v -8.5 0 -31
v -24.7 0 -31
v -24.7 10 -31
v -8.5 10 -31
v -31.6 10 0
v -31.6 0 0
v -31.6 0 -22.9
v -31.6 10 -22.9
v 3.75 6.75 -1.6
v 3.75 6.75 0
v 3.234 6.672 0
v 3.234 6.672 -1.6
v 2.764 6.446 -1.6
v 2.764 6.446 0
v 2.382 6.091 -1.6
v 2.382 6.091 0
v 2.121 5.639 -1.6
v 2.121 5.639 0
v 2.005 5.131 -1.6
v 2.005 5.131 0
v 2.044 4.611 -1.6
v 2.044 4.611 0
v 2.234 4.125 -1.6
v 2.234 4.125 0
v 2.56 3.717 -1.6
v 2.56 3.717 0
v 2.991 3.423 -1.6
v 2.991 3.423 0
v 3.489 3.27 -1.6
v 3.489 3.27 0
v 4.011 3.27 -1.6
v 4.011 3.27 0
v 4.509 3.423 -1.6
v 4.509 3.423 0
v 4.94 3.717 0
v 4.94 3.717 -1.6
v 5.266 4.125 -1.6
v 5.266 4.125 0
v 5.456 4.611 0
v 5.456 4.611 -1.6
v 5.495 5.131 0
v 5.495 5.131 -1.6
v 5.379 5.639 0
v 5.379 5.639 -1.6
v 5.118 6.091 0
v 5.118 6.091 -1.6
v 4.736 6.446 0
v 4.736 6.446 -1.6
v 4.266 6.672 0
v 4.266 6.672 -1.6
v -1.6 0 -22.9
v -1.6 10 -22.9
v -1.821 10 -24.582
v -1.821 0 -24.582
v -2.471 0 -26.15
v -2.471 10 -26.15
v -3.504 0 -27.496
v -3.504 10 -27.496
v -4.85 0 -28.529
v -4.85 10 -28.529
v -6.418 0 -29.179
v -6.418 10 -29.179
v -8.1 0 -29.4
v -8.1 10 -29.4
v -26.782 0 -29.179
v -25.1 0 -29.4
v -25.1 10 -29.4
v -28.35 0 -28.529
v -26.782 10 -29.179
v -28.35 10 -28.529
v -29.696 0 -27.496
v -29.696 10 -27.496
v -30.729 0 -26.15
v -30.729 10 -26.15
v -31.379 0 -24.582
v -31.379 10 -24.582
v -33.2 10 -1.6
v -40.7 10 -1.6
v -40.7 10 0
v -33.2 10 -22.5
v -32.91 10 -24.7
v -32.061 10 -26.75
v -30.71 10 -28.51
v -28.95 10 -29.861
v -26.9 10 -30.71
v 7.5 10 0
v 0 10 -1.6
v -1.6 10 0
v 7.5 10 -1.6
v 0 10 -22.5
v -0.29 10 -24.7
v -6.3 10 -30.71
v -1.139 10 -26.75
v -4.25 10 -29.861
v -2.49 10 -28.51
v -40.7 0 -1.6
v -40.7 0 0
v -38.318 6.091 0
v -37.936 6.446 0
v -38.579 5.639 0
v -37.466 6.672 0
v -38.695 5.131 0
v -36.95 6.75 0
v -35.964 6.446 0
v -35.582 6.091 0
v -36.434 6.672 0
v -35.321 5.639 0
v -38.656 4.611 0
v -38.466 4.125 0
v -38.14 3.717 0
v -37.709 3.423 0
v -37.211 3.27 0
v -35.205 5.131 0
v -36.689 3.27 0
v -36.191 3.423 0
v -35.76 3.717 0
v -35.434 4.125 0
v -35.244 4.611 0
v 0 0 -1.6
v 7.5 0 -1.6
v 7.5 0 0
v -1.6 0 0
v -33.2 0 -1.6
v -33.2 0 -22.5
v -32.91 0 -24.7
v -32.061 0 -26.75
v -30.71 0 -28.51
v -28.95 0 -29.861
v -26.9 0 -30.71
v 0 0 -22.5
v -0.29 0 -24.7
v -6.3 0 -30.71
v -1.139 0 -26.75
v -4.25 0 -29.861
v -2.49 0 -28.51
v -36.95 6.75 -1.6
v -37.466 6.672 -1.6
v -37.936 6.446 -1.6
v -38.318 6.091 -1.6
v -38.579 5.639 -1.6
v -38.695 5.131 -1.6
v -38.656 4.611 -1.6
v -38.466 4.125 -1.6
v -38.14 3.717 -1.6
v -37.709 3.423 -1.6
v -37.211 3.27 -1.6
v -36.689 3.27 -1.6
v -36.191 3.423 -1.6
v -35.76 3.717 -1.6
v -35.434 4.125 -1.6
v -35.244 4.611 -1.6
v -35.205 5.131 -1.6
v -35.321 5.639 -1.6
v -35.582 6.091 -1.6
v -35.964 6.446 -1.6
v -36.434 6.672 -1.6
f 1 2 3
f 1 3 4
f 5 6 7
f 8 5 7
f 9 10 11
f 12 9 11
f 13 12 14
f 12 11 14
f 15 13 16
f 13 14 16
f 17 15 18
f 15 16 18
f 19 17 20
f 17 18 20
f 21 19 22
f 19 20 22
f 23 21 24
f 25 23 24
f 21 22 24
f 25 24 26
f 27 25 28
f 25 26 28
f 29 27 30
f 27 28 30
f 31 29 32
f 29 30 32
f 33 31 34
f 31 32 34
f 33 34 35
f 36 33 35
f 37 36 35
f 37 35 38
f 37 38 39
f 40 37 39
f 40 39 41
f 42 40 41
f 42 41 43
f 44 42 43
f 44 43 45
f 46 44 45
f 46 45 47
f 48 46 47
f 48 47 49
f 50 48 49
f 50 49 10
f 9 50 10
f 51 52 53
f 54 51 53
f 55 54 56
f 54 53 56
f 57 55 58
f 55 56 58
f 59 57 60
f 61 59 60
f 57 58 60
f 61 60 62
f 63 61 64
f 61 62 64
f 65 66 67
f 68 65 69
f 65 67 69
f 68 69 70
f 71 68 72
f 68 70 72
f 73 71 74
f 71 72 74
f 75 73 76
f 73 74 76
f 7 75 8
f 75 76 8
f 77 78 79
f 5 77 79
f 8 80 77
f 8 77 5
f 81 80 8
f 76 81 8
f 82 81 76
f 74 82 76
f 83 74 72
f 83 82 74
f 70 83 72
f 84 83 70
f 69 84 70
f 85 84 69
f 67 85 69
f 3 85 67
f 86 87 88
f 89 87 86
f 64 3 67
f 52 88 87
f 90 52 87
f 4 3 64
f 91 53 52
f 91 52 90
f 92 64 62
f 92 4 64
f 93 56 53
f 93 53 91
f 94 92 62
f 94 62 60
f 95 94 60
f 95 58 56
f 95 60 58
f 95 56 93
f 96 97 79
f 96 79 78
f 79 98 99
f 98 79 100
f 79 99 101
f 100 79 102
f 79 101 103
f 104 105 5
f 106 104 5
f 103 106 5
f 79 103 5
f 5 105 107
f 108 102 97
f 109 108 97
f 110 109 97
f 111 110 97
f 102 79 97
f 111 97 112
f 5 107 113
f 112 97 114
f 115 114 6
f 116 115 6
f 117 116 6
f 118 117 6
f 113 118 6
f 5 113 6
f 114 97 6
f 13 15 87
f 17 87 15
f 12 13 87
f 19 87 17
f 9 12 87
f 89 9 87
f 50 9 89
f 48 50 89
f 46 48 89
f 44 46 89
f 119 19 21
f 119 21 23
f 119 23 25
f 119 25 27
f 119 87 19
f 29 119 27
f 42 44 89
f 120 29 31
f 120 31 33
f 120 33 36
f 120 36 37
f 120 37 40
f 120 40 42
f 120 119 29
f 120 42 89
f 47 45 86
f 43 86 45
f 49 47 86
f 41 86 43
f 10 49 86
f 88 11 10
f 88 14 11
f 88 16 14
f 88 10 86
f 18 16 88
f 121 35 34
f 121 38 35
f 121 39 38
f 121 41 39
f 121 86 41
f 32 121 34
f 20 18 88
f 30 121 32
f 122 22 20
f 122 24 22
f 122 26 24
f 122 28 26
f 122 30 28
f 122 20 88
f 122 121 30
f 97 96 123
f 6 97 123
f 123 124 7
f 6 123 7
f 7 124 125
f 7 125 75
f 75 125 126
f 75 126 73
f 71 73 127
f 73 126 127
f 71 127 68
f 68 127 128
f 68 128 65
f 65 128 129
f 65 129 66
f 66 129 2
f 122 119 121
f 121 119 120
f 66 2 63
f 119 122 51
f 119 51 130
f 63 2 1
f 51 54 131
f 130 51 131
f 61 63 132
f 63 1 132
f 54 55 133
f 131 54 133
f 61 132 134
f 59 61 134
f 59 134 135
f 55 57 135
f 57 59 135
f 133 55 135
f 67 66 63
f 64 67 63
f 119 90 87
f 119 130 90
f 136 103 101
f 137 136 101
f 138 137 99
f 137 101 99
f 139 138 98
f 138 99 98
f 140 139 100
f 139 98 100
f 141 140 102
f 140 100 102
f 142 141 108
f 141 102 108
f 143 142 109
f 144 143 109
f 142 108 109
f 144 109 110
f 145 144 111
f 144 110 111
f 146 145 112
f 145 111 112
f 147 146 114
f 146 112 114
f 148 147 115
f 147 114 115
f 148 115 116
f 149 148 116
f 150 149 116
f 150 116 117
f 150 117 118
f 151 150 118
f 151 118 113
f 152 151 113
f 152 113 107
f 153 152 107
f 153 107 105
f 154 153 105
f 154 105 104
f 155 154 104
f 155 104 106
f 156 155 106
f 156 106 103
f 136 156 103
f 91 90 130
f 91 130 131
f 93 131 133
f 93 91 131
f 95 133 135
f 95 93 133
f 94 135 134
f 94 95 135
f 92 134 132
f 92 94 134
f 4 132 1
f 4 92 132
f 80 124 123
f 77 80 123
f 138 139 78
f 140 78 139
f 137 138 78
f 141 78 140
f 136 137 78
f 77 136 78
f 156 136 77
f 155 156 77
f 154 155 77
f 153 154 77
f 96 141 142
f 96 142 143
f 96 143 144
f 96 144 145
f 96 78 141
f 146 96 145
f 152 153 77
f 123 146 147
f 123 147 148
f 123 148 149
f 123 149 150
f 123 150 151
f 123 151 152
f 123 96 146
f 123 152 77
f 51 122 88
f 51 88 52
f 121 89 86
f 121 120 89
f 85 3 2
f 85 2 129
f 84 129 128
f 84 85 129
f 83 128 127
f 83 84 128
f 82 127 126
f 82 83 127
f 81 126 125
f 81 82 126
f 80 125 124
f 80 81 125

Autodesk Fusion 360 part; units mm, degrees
sketch "Sketch1" plane through (0, 0, 0) normal (0, 1, 0) x (1, 0, 0)
  line L0 (0, 0) -> (-1.6, 0)
  line L1 (-1.6, 0) -> (-1.6, 31)
  line L2 (-1.6, 31) -> (0, 31)
  line L3 (0, 31) -> (0, 0)
  line L4 (7.5, 0) -> (0, 0)
  line L5 (0, 0) -> (0, 1.6)
  line L6 (0, 1.6) -> (7.5, 1.6)
  line L7 (7.5, 1.6) -> (7.5, 0)
  line L8 (-1.6, 31) -> (-31.6, 31)
  line L9 (-31.6, 31) -> (-31.6, 29.4)
  line L10 (-31.6, 29.4) -> (-1.6, 29.4)
  line L11 (-1.6, 29.4) -> (-1.6, 31)
  line L12 (-31.6, 31) -> (-33.2, 31)
  line L13 (-33.2, 31) -> (-33.2, 0)
  line L14 (-33.2, 0) -> (-31.6, 0)
  line L15 (-31.6, 0) -> (-31.6, 31)
  line L16 (-40.7, 1.6) -> (-33.2, 1.6)
  line L17 (-33.2, 1.6) -> (-33.2, 0)
  line L18 (-33.2, 0) -> (-40.7, 0)
  line L19 (-40.7, 0) -> (-40.7, 1.6)
  dimension "d2" = 1.6
  dimension "d3" = 7.5
  dimension "d4" = 1.6
  dimension "d5" = 1.6
  dimension "d6" = 1.6
  dimension "d7" = 30
  dimension "d16" = 29.4
extrude "Extrude1" add sketch "Sketch1" along normal blind 10
hole "Hole1" at (3.75, 5, -1.6) direction (0, 0, 1) diameter 3.5 depth 4 tip angle 118
hole "Hole2" at (-36.95, 5, -1.6) direction (0, 0, 1) diameter 3.5 depth 4 tip angle 118
fillet "Fillet1" radius 6.5 2 edges at (-1.6, 5, -29.4) (-31.6, 5, -29.4)
fillet "Fillet2" radius 8.5 2 edges at (0, 5, -31) (-33.2, 5, -31)
equation "d2 = d4"
equation "d5 = d4"
equation "d6 = d4"
